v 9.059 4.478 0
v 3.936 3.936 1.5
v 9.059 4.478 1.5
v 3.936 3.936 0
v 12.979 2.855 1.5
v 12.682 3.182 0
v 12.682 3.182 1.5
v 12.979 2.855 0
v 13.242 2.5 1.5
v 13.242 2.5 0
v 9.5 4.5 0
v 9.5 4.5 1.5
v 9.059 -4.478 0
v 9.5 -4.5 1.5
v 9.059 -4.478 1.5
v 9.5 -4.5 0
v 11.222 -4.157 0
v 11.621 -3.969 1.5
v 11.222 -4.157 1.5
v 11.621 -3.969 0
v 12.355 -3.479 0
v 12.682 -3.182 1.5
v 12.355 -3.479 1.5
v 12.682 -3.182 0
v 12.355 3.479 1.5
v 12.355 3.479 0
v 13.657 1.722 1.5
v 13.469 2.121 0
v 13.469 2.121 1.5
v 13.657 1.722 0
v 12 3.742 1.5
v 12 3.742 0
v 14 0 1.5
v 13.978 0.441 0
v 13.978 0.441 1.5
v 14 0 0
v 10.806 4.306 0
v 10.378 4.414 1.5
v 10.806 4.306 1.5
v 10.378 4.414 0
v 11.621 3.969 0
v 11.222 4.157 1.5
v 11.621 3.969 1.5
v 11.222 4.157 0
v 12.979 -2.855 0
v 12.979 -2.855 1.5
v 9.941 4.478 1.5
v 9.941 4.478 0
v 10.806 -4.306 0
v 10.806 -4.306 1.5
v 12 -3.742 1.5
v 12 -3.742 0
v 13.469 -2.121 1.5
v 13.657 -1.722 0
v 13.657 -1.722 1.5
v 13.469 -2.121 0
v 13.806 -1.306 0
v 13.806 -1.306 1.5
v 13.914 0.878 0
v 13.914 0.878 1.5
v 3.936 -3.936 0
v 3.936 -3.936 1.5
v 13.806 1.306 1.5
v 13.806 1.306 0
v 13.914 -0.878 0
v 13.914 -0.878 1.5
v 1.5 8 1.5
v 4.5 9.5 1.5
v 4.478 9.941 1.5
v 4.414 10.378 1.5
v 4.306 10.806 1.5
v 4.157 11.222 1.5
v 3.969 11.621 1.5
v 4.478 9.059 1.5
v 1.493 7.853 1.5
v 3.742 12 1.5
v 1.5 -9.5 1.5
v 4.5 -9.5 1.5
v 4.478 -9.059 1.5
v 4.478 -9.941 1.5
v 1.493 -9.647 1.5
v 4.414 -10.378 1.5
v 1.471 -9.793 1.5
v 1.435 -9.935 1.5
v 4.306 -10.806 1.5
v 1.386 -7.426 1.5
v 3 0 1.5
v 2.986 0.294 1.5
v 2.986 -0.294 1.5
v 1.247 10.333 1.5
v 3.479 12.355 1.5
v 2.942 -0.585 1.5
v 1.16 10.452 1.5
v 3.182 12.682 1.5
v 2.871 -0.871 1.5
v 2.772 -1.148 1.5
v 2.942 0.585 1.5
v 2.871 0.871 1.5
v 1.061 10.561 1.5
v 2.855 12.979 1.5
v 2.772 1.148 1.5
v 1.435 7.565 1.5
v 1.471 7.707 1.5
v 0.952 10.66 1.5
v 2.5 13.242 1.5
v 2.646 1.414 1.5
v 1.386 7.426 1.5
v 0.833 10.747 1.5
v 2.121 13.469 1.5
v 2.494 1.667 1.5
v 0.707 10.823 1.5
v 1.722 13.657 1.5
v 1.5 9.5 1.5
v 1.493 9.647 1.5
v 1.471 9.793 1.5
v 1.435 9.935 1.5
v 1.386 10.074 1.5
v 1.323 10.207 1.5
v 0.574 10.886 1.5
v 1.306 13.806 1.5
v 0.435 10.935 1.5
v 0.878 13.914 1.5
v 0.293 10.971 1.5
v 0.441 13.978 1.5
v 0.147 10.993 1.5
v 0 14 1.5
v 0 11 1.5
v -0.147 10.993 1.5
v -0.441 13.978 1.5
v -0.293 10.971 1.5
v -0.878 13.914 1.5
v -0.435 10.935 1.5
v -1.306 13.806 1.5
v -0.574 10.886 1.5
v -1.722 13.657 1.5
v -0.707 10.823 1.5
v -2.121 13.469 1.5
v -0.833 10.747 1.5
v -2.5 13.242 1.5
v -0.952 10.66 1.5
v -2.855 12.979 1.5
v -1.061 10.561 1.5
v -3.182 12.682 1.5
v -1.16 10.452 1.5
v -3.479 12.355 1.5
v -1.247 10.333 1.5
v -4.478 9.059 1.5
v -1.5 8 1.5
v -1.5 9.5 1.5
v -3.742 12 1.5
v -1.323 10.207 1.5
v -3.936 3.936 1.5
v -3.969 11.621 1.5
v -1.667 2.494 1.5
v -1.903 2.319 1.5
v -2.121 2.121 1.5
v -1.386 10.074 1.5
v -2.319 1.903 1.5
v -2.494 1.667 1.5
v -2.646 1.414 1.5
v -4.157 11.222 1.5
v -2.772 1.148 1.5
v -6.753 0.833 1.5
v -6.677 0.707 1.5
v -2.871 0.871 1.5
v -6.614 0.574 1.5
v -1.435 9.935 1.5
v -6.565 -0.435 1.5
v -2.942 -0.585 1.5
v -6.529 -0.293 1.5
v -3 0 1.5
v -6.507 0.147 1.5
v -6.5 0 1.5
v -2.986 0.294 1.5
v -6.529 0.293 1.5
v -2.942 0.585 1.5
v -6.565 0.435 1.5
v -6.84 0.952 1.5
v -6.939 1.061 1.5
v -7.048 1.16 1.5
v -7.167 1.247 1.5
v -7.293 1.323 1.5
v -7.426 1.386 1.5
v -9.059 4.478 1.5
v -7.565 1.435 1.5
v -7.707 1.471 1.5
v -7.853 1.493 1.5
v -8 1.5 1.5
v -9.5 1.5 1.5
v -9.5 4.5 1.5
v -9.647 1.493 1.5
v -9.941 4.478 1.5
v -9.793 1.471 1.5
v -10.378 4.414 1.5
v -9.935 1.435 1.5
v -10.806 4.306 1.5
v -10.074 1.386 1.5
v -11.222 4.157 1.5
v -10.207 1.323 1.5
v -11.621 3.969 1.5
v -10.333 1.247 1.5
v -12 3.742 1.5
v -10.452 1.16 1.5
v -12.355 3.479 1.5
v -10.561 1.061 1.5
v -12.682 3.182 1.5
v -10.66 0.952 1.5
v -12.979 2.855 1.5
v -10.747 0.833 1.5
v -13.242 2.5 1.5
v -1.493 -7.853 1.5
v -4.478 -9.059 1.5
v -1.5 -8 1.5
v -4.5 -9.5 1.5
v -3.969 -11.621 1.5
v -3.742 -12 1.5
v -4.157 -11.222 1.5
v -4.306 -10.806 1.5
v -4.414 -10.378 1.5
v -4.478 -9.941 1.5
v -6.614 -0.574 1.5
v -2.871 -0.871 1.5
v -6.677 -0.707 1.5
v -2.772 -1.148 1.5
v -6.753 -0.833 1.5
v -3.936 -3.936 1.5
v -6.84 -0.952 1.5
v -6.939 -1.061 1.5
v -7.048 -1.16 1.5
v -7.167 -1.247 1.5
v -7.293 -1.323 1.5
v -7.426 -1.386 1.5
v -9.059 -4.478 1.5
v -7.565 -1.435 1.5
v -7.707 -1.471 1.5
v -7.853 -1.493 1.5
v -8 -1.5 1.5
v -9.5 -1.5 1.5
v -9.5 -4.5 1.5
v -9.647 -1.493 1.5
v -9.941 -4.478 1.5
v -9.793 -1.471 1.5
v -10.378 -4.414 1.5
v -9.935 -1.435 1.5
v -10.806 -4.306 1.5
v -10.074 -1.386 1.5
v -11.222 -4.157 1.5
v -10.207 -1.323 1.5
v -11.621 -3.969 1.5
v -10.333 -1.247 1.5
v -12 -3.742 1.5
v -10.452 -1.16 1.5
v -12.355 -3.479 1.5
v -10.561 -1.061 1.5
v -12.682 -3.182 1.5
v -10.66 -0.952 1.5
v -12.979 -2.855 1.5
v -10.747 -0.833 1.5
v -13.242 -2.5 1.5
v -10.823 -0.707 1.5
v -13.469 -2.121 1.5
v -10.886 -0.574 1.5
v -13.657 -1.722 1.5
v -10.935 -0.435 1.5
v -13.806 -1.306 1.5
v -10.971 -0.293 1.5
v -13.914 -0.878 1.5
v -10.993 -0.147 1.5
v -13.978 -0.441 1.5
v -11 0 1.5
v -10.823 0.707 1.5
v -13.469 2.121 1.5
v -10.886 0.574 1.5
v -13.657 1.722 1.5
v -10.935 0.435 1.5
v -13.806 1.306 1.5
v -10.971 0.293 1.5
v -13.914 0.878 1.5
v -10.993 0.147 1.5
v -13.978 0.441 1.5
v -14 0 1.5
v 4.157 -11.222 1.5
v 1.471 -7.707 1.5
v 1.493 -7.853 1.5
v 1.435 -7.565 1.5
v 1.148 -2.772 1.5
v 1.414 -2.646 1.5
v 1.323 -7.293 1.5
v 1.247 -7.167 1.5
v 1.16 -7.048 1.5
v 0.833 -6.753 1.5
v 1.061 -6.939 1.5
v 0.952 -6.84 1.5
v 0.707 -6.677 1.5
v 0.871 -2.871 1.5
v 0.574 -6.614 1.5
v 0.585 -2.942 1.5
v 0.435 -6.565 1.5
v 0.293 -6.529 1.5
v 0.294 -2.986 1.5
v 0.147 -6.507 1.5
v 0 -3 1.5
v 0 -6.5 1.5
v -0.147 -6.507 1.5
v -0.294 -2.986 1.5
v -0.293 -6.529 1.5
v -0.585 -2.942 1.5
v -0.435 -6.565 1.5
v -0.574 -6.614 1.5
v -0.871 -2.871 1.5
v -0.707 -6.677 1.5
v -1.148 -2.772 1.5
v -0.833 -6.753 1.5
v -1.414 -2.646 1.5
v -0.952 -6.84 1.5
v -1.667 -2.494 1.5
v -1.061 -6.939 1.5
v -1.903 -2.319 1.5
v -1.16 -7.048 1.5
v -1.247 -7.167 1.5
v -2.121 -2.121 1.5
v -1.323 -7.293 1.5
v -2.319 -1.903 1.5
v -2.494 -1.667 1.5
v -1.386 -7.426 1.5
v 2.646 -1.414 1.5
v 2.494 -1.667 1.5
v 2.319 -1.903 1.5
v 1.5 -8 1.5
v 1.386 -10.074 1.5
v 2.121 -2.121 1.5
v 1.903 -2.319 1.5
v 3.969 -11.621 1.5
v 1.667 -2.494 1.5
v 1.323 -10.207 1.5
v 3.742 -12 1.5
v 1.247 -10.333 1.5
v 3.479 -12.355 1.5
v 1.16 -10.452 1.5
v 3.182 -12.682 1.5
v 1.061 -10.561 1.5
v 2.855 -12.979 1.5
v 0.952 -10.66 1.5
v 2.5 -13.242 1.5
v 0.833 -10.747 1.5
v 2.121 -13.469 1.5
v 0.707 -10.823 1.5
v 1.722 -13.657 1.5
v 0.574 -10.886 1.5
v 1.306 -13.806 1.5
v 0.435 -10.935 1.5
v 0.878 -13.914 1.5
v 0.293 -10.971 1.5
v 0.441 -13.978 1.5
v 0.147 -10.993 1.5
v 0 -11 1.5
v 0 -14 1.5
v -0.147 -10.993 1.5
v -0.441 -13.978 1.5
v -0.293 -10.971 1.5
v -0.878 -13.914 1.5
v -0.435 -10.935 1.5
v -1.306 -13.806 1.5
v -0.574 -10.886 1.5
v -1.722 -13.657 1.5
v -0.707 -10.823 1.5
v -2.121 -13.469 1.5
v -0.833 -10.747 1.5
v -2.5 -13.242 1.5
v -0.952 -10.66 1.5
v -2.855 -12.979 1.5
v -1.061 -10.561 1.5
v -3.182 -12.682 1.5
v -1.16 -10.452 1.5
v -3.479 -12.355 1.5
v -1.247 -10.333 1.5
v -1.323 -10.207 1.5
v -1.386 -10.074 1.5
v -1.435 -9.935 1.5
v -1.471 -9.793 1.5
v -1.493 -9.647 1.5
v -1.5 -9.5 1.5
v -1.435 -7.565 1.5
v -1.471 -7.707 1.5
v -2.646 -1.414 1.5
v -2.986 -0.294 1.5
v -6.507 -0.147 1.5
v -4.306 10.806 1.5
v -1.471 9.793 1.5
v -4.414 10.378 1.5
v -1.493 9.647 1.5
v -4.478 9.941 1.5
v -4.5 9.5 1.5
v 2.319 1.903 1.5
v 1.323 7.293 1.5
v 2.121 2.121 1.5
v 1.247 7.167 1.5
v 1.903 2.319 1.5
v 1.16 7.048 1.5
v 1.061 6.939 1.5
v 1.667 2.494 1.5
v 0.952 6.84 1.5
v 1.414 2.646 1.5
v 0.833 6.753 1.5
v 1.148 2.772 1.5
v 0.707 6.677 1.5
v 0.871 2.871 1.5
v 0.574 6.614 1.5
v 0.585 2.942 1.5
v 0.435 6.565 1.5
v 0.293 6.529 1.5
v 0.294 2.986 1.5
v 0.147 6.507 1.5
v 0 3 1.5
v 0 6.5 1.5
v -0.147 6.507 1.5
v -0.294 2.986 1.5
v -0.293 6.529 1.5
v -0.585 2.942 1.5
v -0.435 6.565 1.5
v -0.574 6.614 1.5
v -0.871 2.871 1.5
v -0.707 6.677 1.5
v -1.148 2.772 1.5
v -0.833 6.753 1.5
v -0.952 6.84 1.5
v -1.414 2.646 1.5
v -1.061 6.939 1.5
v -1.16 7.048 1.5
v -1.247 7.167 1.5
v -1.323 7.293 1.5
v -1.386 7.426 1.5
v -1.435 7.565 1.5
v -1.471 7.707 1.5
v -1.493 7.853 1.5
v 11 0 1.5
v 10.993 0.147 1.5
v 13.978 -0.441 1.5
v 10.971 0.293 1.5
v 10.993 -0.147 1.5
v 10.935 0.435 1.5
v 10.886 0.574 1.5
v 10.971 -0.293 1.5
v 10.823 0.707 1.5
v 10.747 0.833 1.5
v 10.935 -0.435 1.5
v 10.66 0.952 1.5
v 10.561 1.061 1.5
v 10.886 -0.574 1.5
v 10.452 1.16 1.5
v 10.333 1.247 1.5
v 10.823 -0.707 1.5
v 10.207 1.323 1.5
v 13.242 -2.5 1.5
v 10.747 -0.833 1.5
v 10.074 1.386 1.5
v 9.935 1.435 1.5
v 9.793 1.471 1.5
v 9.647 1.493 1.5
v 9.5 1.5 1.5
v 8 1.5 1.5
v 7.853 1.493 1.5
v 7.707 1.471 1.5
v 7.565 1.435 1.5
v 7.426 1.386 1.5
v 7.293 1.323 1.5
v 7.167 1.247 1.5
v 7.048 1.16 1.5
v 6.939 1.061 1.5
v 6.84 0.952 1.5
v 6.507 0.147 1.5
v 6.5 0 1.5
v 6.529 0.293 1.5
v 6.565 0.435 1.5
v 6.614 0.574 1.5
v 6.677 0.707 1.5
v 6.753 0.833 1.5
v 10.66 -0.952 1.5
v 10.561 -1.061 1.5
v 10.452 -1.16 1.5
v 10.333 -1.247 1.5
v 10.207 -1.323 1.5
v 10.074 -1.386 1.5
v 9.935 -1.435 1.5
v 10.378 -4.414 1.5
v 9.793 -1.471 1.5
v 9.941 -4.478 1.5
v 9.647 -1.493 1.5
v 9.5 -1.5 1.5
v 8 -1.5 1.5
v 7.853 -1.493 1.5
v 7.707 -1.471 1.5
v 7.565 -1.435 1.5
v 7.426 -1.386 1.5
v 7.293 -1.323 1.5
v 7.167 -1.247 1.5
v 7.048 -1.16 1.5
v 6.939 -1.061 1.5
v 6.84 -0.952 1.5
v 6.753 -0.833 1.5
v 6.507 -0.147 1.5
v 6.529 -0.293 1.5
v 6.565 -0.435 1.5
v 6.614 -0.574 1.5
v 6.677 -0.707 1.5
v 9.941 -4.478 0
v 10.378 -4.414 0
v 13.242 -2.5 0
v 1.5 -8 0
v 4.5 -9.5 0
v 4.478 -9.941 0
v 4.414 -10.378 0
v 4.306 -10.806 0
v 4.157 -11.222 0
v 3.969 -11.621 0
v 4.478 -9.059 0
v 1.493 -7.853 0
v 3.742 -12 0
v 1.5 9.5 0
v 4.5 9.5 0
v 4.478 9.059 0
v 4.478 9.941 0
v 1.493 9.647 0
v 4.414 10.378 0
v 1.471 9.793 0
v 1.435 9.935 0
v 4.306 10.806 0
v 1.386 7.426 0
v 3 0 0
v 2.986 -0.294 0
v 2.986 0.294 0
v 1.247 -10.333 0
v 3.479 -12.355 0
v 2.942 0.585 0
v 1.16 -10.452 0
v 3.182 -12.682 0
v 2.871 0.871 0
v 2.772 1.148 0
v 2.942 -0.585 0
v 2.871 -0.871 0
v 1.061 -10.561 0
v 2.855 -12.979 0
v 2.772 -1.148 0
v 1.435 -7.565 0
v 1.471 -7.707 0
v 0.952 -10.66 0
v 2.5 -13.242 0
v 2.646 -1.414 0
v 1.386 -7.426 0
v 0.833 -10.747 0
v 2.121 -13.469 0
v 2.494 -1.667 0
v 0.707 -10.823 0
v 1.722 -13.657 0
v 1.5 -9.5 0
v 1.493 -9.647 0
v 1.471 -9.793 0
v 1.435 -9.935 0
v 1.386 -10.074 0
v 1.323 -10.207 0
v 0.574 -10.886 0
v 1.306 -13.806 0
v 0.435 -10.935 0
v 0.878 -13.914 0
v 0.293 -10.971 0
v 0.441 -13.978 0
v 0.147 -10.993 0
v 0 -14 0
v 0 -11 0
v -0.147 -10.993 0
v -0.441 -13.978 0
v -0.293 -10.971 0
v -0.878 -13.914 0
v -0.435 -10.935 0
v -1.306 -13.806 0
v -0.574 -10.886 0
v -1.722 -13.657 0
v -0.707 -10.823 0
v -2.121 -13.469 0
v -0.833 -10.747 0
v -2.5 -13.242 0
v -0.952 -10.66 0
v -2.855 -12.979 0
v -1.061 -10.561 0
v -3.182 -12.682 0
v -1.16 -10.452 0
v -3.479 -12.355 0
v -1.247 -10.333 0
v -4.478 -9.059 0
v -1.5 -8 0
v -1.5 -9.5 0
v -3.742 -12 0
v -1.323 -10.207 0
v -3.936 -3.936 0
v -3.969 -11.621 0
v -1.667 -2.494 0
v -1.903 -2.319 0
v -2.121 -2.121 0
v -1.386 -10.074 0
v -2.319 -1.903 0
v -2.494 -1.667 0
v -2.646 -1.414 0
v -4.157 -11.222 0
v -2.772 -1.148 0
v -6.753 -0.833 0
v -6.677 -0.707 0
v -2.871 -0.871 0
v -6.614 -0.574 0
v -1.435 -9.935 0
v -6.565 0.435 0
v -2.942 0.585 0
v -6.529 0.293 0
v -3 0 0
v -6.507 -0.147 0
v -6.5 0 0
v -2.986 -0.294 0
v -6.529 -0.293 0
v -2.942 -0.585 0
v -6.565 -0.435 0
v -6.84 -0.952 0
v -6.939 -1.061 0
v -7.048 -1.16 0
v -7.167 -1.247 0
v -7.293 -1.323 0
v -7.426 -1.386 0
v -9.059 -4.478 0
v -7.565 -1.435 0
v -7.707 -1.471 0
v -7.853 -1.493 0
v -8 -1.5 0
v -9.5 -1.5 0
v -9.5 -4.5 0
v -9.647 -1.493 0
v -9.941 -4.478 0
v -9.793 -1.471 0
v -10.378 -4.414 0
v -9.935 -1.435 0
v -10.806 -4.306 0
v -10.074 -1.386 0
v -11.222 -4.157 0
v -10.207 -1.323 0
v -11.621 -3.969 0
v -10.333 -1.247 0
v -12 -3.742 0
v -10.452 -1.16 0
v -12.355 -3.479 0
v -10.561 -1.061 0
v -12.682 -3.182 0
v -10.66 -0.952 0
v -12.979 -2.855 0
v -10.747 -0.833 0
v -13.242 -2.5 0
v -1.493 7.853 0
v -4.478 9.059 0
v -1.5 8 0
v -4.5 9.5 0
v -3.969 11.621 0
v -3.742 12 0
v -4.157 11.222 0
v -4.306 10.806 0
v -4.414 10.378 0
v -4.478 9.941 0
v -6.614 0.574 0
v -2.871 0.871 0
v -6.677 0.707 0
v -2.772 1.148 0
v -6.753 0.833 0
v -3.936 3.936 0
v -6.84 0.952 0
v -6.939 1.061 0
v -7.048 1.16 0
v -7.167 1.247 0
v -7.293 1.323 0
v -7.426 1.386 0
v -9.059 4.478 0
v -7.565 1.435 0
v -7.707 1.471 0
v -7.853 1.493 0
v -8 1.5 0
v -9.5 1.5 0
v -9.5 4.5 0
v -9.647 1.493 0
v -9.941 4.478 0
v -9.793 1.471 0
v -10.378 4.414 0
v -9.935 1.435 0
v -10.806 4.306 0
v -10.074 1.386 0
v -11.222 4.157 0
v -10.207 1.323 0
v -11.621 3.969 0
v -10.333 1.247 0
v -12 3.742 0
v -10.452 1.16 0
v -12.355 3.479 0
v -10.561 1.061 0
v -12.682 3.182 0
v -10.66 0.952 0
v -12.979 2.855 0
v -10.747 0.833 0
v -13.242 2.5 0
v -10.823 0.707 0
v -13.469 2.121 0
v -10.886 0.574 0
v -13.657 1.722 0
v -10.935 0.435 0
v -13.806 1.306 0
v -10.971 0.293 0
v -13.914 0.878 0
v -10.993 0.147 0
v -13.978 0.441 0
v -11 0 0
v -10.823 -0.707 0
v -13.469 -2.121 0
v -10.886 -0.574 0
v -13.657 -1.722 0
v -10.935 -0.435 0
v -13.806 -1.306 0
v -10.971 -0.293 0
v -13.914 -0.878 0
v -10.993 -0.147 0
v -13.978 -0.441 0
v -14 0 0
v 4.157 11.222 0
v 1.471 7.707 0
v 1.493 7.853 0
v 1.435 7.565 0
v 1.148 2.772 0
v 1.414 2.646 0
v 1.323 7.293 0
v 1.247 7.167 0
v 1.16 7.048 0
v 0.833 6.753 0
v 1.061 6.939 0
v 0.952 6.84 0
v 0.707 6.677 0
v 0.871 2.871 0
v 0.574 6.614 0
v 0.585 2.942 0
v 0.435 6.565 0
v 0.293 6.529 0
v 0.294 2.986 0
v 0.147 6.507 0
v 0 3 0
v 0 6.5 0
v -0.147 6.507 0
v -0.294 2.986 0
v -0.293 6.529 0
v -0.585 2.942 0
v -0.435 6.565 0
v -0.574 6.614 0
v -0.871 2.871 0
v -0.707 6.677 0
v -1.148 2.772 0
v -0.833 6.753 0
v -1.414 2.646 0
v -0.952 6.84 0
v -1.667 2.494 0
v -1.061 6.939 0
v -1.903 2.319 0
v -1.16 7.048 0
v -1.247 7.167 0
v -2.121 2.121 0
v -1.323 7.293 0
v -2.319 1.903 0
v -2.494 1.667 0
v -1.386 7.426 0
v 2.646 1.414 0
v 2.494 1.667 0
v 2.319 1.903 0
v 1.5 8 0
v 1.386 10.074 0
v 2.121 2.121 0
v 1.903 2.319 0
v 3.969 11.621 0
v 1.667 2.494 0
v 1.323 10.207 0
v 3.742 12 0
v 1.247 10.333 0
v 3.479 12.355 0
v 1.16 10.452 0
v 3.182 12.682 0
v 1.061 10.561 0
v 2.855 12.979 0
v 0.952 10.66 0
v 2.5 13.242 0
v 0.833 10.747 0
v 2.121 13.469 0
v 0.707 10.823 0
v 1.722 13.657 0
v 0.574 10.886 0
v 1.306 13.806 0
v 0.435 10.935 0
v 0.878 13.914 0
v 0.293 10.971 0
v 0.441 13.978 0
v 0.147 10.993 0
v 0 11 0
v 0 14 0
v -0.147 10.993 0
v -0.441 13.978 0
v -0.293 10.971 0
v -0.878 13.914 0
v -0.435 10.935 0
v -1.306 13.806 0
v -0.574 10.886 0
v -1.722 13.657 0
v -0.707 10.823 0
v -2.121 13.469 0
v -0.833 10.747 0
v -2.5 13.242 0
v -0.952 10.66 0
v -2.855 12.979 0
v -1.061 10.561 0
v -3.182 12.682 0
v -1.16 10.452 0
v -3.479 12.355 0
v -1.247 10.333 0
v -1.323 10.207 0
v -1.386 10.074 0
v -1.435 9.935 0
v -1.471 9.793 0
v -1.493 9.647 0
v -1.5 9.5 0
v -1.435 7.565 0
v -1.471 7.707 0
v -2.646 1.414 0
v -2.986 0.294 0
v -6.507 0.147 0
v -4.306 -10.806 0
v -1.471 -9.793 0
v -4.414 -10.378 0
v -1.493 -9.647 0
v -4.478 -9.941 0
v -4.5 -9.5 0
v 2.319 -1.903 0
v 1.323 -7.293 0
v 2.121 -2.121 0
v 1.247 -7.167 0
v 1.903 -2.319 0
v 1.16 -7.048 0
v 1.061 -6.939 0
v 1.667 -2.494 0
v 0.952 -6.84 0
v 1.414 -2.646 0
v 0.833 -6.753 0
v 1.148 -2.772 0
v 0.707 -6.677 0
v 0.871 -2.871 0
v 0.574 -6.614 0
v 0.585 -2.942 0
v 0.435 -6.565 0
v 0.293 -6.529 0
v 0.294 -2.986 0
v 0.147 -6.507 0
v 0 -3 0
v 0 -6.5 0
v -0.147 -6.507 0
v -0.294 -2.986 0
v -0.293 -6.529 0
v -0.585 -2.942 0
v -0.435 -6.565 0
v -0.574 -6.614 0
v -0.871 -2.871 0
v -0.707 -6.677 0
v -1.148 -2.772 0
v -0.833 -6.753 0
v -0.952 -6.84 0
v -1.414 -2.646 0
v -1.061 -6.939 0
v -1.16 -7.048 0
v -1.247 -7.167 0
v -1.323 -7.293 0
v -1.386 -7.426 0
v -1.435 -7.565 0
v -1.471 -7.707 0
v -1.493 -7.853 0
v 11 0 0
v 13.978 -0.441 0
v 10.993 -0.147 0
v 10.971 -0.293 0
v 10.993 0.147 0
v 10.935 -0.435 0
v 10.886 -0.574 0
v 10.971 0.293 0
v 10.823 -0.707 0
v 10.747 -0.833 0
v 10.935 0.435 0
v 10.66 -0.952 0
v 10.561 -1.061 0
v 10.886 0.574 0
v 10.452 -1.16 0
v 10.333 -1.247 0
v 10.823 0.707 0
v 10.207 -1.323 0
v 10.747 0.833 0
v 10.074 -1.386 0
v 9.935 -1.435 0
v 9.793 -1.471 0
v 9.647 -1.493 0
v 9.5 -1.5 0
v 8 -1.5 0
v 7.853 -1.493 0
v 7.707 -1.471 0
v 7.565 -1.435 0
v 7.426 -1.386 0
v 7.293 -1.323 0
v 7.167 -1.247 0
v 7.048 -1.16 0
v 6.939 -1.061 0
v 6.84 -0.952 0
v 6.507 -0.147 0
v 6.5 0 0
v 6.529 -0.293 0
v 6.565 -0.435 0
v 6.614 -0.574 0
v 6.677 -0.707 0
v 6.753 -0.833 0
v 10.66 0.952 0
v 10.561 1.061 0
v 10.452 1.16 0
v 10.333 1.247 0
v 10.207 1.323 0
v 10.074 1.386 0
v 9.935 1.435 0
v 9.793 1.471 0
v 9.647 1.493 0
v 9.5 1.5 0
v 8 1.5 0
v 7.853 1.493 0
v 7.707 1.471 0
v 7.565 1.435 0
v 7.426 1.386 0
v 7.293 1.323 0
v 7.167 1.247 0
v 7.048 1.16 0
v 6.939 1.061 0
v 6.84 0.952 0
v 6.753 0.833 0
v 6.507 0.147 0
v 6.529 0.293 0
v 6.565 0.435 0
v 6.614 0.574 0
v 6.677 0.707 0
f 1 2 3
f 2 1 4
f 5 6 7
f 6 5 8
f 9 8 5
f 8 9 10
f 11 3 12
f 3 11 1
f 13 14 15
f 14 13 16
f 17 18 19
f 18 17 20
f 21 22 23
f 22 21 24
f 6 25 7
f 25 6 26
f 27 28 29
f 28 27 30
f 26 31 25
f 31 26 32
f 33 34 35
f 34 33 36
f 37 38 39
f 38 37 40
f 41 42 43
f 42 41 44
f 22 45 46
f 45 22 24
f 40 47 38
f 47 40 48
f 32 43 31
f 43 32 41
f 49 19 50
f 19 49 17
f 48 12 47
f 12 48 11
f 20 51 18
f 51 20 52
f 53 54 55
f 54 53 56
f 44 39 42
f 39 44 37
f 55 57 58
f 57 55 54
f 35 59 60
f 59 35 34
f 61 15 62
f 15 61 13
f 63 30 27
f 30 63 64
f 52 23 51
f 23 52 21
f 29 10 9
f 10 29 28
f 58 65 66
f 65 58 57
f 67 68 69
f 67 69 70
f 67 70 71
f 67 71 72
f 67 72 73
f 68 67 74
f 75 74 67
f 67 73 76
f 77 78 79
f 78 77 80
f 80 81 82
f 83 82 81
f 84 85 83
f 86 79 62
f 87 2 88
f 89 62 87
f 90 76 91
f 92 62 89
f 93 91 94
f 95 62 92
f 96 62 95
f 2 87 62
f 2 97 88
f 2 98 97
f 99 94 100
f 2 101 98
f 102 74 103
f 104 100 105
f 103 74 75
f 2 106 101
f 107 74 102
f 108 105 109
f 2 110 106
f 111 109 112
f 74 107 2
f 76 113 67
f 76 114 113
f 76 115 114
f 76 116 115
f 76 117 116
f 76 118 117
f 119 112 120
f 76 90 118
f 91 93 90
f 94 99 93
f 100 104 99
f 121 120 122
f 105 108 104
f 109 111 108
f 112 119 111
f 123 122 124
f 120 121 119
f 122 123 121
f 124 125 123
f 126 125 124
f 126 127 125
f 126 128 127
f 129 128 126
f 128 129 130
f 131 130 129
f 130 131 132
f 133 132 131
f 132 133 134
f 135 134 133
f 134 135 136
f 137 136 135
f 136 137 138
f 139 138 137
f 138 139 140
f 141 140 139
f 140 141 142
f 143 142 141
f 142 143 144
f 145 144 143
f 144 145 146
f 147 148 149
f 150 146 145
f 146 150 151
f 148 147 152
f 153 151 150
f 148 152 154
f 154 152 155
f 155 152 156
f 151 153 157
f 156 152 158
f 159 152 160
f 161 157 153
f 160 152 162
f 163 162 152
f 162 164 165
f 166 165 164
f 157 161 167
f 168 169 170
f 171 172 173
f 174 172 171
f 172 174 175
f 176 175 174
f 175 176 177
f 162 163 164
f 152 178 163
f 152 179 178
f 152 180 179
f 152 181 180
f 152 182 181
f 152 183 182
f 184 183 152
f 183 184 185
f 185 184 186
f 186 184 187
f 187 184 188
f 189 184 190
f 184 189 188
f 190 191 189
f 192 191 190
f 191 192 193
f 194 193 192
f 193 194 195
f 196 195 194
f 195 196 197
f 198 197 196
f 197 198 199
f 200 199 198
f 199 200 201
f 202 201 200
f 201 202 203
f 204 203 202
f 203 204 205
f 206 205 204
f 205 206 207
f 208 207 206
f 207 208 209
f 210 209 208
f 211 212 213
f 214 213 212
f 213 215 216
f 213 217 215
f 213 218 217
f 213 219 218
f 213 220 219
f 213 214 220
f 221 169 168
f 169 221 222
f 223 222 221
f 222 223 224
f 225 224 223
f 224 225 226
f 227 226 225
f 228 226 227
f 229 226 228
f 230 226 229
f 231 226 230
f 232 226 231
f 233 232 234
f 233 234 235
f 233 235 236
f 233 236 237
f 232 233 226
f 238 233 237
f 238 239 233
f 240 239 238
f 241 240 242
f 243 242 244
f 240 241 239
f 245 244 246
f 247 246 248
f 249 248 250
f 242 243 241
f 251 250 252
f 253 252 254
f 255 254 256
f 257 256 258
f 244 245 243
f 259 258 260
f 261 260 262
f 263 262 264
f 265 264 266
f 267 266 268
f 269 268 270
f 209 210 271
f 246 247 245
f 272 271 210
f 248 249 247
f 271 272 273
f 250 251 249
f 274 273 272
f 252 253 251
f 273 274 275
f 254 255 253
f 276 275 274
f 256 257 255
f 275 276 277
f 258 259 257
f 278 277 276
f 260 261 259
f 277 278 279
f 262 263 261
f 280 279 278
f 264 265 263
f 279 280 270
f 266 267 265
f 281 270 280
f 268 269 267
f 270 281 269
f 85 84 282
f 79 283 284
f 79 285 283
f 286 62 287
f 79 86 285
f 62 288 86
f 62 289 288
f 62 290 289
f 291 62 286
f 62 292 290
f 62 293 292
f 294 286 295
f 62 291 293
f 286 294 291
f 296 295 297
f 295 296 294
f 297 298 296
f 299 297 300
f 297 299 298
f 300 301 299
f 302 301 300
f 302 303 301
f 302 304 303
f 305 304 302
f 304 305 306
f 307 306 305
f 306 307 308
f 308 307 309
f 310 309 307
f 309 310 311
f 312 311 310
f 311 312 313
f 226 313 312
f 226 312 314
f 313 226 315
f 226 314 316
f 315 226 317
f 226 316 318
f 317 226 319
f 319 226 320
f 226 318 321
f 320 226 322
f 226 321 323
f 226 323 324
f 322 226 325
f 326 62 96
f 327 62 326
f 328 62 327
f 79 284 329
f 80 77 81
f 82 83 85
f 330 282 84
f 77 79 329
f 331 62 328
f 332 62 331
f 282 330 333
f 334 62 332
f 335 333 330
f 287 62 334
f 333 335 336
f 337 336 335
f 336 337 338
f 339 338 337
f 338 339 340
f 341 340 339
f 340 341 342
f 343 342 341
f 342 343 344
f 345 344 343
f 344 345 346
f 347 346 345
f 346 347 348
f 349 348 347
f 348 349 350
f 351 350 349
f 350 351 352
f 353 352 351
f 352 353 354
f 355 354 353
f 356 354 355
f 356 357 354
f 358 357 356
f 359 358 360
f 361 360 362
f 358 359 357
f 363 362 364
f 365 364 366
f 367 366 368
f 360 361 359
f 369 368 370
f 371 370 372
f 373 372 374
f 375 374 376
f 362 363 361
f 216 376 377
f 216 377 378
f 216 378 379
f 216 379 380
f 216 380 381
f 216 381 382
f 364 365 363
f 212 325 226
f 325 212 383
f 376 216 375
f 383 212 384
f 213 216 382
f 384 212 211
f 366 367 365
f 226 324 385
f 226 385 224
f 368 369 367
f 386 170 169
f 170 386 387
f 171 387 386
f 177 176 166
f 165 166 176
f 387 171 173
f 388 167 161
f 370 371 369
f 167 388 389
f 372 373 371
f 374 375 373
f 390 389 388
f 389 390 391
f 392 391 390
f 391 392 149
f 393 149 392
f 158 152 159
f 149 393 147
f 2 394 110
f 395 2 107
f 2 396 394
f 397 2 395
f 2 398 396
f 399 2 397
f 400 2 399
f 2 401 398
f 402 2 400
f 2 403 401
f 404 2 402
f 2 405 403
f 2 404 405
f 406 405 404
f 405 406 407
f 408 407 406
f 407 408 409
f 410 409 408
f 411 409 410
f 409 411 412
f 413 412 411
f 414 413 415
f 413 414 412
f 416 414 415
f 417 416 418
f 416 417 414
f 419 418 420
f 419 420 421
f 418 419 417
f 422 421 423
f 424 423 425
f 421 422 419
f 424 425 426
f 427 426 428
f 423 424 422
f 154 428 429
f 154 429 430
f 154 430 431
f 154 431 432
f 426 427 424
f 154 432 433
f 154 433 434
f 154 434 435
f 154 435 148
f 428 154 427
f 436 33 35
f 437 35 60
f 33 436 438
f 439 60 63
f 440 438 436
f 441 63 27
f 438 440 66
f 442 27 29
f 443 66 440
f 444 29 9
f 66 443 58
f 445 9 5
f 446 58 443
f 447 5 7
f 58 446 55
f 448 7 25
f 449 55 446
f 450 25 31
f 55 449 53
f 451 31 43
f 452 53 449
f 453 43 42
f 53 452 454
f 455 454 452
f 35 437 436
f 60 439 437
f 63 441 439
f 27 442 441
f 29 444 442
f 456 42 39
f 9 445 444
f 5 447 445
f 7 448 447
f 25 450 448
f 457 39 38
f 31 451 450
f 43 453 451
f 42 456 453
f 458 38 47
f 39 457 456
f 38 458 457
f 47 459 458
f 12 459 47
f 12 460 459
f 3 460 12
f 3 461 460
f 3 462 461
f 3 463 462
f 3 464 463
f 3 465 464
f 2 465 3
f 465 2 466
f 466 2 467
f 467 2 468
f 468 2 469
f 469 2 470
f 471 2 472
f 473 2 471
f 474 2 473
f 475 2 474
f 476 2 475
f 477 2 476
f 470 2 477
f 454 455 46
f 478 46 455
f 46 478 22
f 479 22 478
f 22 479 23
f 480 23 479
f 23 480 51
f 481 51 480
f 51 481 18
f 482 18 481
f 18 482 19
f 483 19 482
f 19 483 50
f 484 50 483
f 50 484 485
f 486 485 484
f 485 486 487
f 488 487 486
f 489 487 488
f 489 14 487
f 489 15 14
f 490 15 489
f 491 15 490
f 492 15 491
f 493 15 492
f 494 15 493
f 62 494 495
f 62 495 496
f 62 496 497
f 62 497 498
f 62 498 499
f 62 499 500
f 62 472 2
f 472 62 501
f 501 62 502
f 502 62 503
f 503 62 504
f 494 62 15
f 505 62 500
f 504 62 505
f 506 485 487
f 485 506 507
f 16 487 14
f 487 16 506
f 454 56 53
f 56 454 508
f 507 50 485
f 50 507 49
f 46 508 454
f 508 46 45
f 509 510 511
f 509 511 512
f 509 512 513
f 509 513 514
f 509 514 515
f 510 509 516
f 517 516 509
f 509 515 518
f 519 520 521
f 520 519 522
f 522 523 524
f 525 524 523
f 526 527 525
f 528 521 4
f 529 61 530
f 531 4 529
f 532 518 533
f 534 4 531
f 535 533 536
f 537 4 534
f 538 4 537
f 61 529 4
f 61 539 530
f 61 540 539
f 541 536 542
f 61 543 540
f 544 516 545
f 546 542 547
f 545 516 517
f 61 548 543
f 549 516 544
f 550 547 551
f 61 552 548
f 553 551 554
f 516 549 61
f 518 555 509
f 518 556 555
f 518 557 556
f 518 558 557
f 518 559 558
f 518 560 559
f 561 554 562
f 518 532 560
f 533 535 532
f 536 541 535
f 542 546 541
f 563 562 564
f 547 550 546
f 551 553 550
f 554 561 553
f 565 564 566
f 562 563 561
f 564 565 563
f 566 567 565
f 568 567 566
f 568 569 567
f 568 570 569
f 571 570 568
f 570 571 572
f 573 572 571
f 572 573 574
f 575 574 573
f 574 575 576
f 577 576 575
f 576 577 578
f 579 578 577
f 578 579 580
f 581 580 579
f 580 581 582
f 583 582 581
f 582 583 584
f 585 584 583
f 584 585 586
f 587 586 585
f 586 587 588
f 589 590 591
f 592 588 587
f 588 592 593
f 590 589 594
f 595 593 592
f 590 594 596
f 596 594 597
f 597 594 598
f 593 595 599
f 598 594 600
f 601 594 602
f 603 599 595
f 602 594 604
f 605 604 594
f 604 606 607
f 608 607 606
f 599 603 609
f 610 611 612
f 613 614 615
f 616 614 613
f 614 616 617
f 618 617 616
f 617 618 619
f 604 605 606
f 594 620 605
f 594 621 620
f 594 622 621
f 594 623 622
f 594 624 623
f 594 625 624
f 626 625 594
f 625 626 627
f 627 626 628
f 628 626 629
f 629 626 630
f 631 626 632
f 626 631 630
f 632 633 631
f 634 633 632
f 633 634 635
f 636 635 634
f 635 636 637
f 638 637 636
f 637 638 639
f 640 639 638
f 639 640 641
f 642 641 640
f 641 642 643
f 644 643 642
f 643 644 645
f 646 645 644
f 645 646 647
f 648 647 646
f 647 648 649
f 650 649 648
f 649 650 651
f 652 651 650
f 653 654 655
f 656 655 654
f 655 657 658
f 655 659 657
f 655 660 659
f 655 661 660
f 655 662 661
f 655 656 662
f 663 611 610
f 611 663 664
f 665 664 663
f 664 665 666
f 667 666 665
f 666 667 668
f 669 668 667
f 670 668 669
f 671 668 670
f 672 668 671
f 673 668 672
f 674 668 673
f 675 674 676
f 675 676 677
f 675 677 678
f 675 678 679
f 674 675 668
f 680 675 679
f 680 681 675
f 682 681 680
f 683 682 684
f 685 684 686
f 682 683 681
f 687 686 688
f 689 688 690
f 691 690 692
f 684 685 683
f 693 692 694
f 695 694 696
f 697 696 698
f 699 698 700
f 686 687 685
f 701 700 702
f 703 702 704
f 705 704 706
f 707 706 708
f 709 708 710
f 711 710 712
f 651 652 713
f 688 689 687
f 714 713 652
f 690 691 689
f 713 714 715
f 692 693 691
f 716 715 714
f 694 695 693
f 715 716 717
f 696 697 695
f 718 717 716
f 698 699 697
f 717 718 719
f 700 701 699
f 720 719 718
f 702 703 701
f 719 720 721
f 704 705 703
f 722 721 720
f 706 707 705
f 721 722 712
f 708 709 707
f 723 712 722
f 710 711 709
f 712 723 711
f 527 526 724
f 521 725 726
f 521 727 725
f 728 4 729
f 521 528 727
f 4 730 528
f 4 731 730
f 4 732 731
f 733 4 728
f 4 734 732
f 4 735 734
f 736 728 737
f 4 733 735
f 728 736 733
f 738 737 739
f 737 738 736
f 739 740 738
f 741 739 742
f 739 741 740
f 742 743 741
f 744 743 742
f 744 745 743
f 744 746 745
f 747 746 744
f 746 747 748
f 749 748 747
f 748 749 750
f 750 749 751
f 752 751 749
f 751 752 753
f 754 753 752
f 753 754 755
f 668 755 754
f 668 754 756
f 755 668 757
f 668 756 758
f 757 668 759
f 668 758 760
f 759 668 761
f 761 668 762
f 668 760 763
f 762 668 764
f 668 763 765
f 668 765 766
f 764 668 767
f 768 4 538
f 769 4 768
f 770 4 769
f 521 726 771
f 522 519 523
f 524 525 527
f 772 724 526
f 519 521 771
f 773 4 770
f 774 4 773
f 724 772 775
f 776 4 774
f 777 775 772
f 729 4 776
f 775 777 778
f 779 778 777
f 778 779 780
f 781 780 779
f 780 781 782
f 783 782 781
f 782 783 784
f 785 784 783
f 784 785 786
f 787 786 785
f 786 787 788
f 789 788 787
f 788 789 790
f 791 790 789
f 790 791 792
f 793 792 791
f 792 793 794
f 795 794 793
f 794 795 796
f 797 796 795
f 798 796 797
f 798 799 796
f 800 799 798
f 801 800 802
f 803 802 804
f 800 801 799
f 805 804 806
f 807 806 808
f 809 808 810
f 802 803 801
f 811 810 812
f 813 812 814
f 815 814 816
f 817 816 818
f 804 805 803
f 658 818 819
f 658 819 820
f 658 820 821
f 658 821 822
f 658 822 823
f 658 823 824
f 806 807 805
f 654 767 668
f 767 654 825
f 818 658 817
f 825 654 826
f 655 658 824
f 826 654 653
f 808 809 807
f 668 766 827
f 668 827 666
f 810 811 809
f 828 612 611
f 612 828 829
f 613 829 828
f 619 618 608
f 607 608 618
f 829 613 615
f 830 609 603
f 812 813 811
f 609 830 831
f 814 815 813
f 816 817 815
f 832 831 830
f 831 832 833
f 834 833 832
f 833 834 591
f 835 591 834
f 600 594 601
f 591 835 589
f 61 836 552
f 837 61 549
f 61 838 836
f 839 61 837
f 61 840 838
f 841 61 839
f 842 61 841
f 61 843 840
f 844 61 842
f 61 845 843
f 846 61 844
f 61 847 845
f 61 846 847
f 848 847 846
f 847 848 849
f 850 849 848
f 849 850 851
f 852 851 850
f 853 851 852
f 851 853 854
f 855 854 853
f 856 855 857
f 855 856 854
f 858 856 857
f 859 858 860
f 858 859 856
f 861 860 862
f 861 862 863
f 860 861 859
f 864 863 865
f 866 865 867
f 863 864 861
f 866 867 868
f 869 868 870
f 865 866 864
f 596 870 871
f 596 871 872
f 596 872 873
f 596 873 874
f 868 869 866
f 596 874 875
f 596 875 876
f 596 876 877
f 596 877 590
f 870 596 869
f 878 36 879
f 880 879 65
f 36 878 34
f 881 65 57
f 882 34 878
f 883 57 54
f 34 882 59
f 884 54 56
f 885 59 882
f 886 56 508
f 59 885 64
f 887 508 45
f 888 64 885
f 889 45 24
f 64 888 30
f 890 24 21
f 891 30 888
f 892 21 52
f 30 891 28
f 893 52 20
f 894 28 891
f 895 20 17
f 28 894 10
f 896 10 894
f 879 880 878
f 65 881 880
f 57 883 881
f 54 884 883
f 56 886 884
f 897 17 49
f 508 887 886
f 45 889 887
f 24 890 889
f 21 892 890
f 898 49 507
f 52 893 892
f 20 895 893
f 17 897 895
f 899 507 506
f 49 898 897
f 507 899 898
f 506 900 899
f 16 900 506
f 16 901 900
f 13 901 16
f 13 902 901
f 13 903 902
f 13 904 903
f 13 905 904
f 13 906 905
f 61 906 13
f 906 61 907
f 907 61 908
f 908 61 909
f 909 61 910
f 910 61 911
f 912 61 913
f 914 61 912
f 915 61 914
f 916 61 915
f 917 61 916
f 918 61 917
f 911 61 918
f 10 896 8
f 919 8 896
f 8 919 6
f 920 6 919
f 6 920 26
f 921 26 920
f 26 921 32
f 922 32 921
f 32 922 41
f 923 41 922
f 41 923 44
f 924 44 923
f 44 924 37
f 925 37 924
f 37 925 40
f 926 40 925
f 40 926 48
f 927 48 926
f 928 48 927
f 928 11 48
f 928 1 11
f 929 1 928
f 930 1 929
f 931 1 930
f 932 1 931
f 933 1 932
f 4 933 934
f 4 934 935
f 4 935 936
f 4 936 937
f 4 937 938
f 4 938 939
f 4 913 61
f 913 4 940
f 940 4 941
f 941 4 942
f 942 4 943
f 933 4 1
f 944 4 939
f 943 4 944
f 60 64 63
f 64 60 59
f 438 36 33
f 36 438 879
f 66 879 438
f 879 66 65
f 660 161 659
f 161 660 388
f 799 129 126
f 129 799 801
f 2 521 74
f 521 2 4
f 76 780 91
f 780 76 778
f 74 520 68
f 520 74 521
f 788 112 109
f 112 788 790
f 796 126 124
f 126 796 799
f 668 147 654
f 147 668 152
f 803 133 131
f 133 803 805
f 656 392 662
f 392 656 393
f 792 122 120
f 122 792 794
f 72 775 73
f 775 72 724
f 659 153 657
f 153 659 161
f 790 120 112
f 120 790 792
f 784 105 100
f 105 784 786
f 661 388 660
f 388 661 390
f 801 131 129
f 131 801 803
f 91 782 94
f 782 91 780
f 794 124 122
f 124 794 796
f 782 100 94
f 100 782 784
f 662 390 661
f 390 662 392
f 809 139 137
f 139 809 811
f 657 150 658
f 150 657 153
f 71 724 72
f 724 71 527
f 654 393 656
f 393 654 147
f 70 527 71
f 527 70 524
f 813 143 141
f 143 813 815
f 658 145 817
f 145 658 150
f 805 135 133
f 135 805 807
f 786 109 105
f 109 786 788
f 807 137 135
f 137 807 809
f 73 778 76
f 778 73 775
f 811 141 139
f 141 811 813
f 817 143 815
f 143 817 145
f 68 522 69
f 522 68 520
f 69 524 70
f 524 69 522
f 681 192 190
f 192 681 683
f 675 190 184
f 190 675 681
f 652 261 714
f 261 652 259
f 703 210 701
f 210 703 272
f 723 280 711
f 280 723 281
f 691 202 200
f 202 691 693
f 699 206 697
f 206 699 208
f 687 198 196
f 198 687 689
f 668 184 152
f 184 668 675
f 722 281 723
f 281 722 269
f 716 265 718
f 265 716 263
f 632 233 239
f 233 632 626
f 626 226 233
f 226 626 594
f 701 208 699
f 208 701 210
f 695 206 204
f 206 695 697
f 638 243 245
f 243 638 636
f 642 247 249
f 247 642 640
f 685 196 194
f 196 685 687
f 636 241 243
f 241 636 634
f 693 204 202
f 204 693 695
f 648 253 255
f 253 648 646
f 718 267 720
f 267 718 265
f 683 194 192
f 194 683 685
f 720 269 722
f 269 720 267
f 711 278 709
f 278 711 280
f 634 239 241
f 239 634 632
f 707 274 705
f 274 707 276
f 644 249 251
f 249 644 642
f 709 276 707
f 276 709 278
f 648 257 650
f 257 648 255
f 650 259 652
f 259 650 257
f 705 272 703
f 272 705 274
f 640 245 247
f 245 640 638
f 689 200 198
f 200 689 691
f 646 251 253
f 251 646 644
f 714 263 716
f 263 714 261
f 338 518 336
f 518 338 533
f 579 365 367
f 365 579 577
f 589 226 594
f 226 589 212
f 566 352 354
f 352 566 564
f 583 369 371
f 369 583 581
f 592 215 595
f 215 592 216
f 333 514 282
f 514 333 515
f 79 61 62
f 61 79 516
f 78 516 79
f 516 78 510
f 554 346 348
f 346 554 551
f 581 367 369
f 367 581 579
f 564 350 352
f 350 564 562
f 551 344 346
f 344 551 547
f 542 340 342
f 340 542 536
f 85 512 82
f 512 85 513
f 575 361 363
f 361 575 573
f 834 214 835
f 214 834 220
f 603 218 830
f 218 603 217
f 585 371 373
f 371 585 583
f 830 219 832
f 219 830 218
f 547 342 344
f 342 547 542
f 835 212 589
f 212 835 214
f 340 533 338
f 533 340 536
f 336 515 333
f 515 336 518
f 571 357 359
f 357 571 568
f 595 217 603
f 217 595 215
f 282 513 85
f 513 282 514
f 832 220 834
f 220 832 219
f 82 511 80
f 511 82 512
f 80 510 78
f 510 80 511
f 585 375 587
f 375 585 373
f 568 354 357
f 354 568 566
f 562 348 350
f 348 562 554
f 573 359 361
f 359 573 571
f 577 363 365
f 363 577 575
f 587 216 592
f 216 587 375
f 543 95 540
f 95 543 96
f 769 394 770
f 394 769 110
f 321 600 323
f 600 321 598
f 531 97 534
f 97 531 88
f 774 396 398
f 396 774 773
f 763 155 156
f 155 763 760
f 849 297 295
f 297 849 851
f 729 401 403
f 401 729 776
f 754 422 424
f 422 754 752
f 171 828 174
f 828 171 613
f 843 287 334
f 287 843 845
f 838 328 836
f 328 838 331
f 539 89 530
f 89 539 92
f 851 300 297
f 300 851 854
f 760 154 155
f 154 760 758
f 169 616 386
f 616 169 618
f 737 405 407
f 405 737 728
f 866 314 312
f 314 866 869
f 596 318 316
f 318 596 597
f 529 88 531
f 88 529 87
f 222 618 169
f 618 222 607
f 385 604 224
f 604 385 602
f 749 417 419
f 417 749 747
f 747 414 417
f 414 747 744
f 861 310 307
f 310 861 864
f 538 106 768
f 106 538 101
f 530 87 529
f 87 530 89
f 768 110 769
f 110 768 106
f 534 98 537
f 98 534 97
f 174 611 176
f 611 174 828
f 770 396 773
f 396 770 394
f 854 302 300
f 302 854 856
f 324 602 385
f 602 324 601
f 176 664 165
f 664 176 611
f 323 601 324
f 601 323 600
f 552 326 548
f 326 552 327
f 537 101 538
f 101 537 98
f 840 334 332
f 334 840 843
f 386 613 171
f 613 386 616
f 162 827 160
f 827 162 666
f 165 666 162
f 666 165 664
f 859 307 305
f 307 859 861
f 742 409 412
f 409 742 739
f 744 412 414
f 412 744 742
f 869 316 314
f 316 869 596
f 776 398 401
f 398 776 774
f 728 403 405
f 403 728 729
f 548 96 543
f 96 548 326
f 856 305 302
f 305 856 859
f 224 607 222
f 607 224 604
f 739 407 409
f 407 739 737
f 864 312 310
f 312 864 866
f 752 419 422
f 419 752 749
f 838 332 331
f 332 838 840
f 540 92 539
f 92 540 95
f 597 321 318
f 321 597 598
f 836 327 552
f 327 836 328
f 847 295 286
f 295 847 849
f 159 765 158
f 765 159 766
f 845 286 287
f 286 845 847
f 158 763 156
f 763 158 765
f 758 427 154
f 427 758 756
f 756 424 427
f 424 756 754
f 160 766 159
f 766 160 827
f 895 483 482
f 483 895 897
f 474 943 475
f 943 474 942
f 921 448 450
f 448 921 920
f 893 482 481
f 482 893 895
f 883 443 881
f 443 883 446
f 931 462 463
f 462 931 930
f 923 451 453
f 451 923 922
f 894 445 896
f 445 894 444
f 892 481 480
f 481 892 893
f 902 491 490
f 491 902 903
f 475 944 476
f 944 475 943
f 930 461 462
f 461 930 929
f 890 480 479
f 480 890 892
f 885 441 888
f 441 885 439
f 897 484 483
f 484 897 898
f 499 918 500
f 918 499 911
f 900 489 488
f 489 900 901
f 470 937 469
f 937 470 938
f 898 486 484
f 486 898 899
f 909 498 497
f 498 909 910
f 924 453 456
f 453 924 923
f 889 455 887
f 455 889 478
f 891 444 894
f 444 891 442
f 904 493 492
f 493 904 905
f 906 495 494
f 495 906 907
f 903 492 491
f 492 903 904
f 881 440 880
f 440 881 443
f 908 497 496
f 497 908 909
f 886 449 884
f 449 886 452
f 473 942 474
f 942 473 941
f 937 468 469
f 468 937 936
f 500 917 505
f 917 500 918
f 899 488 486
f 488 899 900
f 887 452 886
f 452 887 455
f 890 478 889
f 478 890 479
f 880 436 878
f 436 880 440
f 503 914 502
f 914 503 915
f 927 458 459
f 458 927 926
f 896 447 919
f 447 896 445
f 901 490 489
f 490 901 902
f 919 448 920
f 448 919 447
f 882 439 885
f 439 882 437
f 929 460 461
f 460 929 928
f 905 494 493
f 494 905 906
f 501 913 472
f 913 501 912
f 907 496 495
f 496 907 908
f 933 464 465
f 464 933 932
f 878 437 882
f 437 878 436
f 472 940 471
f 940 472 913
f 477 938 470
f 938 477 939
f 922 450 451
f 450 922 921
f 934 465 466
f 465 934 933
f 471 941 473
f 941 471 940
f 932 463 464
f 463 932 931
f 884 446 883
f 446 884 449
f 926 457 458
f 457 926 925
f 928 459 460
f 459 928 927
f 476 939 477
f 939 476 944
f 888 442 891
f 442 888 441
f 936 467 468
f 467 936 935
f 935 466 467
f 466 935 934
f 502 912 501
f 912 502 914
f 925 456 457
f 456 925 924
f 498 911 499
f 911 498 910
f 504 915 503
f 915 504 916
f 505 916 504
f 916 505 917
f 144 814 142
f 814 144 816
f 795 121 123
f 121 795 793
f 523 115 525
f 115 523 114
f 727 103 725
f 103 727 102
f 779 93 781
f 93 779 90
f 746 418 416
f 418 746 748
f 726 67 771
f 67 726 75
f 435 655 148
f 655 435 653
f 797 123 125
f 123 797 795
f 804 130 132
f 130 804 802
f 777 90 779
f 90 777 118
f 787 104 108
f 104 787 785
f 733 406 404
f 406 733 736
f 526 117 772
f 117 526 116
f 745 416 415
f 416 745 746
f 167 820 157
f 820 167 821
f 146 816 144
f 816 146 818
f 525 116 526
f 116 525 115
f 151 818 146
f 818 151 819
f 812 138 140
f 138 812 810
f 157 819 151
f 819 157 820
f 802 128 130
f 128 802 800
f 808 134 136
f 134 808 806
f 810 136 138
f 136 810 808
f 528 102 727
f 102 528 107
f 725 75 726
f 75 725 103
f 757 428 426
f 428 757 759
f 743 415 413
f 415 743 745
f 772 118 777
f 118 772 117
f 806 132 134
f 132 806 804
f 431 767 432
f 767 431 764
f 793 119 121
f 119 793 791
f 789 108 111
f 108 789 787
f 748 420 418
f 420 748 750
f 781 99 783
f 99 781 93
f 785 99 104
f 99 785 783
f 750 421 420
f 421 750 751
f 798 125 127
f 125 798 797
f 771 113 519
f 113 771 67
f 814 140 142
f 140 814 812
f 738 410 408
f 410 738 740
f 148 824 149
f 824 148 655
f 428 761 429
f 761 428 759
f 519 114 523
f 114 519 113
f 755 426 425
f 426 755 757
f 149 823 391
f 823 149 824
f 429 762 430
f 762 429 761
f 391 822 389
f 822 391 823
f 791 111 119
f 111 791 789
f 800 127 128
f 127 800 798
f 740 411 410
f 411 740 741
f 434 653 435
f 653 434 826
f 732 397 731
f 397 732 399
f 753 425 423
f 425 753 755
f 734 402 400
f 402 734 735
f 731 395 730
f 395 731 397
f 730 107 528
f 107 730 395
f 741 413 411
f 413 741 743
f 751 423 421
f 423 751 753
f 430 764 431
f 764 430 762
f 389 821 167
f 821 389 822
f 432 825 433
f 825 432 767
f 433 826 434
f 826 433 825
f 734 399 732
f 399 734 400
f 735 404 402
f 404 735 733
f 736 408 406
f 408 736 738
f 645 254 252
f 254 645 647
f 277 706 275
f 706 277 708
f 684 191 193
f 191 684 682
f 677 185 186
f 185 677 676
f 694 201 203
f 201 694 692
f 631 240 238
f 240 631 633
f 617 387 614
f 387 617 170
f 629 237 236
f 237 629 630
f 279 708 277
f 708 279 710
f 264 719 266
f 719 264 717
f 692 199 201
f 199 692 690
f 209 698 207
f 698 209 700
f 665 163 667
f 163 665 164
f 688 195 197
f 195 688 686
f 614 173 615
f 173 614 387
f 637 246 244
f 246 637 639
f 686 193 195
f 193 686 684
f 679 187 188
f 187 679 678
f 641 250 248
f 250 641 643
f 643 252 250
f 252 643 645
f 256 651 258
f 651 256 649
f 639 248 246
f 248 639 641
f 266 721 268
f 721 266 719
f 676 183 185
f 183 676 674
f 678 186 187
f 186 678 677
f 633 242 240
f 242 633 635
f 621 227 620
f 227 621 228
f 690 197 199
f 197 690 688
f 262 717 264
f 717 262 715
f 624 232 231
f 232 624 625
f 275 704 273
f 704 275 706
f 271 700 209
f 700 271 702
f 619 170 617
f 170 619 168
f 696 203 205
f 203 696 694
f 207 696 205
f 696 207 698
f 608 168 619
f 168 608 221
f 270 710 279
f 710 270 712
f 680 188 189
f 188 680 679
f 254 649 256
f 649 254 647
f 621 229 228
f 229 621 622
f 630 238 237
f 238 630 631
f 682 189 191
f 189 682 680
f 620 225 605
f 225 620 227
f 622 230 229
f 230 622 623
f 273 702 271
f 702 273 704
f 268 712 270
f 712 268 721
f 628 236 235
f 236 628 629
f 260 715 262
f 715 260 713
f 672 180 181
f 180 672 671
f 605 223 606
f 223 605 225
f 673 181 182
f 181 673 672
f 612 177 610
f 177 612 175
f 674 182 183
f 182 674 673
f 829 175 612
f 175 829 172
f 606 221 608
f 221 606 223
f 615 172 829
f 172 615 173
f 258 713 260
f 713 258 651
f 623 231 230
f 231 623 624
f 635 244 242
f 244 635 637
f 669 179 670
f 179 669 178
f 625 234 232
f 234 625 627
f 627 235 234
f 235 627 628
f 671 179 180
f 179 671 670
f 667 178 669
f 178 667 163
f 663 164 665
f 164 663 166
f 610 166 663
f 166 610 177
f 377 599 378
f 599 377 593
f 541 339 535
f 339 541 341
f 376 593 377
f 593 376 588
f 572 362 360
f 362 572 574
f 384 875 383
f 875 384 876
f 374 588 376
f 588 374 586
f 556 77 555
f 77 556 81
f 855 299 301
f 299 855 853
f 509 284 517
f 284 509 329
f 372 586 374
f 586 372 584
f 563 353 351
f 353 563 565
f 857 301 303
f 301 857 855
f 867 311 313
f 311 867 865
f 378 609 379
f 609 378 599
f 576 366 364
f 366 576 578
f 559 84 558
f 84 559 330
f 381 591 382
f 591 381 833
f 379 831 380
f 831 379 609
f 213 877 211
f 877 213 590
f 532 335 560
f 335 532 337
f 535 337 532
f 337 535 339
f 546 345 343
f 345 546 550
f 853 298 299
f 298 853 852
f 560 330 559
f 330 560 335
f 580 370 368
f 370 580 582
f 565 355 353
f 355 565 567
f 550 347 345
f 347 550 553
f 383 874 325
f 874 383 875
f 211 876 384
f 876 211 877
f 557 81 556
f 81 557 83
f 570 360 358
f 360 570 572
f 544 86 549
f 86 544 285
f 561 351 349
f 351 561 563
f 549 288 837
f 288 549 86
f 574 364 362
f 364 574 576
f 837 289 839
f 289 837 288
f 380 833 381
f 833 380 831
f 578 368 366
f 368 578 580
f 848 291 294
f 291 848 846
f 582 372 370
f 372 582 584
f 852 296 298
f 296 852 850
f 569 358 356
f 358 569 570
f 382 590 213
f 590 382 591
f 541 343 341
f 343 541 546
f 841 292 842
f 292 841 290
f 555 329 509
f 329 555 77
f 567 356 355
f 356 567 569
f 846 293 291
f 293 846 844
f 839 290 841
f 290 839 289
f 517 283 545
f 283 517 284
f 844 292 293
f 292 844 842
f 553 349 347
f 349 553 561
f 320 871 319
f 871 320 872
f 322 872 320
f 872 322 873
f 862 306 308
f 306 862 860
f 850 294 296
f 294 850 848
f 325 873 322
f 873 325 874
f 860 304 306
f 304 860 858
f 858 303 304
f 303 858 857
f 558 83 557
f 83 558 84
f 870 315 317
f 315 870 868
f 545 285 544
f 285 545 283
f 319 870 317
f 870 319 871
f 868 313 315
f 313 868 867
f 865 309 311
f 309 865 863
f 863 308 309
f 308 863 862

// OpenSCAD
// Diameter of the center element
centerDiameter = 7;
// DIameter of the hole in the center (this should be smaller than centerDiameter)
centerHoleDiameter = 6;

// Walls around the screw hole/slot
walls = 3;

// Diameter of the screw hole/slot
screwHoleDiameter = 3;

// Max spacing between the screw holes
outerScrewDiameter = 19;
// Min spacing between the screw holes
innerScrewDiameter = 16;

// Height of the pad
height = 1.5;

// Shape of the pad
shape = "cross"; // [cross, cricle]

/* [Hidden] */
$fn = 64;
centerHoleRadius = centerHoleDiameter / 2;
centerRadius = centerDiameter / 2;

screwHoleRadius = screwHoleDiameter / 2;

outerRadius = screwHoleRadius + walls; //outerDiameter / 2;

screwHoleOffset = outerScrewDiameter / 2;

screwHoleLength = (outerScrewDiameter - innerScrewDiameter) / 2;

module shape() {
  group() {
    if(shape == "cross") {
      for(a = [0:90:360])
        hull() {
          cylinder(r = centerRadius, h = height);
          rotate([0, 0, a])
            translate([screwHoleOffset, 0, 0])
              cylinder(r = outerRadius, h = height);
        }
    } else {
      cylinder(r = screwHoleOffset + screwHoleRadius + walls, h = height);
    }
  }  
}

difference() {
  shape();

  for(a = [0:90:360])
    translate([0, 0, -1]) {
      cylinder(r = centerHoleRadius, h = height + 2);
      
      rotate([0, 0, a]) {
        translate([screwHoleOffset, 0, 0]) {
          hull() {
            cylinder(r = screwHoleRadius, h = height + 2);
            translate([-screwHoleLength, 0, 0])
              cylinder(r = screwHoleRadius, h = height + 2);
          }
        }
      }
    }
}
